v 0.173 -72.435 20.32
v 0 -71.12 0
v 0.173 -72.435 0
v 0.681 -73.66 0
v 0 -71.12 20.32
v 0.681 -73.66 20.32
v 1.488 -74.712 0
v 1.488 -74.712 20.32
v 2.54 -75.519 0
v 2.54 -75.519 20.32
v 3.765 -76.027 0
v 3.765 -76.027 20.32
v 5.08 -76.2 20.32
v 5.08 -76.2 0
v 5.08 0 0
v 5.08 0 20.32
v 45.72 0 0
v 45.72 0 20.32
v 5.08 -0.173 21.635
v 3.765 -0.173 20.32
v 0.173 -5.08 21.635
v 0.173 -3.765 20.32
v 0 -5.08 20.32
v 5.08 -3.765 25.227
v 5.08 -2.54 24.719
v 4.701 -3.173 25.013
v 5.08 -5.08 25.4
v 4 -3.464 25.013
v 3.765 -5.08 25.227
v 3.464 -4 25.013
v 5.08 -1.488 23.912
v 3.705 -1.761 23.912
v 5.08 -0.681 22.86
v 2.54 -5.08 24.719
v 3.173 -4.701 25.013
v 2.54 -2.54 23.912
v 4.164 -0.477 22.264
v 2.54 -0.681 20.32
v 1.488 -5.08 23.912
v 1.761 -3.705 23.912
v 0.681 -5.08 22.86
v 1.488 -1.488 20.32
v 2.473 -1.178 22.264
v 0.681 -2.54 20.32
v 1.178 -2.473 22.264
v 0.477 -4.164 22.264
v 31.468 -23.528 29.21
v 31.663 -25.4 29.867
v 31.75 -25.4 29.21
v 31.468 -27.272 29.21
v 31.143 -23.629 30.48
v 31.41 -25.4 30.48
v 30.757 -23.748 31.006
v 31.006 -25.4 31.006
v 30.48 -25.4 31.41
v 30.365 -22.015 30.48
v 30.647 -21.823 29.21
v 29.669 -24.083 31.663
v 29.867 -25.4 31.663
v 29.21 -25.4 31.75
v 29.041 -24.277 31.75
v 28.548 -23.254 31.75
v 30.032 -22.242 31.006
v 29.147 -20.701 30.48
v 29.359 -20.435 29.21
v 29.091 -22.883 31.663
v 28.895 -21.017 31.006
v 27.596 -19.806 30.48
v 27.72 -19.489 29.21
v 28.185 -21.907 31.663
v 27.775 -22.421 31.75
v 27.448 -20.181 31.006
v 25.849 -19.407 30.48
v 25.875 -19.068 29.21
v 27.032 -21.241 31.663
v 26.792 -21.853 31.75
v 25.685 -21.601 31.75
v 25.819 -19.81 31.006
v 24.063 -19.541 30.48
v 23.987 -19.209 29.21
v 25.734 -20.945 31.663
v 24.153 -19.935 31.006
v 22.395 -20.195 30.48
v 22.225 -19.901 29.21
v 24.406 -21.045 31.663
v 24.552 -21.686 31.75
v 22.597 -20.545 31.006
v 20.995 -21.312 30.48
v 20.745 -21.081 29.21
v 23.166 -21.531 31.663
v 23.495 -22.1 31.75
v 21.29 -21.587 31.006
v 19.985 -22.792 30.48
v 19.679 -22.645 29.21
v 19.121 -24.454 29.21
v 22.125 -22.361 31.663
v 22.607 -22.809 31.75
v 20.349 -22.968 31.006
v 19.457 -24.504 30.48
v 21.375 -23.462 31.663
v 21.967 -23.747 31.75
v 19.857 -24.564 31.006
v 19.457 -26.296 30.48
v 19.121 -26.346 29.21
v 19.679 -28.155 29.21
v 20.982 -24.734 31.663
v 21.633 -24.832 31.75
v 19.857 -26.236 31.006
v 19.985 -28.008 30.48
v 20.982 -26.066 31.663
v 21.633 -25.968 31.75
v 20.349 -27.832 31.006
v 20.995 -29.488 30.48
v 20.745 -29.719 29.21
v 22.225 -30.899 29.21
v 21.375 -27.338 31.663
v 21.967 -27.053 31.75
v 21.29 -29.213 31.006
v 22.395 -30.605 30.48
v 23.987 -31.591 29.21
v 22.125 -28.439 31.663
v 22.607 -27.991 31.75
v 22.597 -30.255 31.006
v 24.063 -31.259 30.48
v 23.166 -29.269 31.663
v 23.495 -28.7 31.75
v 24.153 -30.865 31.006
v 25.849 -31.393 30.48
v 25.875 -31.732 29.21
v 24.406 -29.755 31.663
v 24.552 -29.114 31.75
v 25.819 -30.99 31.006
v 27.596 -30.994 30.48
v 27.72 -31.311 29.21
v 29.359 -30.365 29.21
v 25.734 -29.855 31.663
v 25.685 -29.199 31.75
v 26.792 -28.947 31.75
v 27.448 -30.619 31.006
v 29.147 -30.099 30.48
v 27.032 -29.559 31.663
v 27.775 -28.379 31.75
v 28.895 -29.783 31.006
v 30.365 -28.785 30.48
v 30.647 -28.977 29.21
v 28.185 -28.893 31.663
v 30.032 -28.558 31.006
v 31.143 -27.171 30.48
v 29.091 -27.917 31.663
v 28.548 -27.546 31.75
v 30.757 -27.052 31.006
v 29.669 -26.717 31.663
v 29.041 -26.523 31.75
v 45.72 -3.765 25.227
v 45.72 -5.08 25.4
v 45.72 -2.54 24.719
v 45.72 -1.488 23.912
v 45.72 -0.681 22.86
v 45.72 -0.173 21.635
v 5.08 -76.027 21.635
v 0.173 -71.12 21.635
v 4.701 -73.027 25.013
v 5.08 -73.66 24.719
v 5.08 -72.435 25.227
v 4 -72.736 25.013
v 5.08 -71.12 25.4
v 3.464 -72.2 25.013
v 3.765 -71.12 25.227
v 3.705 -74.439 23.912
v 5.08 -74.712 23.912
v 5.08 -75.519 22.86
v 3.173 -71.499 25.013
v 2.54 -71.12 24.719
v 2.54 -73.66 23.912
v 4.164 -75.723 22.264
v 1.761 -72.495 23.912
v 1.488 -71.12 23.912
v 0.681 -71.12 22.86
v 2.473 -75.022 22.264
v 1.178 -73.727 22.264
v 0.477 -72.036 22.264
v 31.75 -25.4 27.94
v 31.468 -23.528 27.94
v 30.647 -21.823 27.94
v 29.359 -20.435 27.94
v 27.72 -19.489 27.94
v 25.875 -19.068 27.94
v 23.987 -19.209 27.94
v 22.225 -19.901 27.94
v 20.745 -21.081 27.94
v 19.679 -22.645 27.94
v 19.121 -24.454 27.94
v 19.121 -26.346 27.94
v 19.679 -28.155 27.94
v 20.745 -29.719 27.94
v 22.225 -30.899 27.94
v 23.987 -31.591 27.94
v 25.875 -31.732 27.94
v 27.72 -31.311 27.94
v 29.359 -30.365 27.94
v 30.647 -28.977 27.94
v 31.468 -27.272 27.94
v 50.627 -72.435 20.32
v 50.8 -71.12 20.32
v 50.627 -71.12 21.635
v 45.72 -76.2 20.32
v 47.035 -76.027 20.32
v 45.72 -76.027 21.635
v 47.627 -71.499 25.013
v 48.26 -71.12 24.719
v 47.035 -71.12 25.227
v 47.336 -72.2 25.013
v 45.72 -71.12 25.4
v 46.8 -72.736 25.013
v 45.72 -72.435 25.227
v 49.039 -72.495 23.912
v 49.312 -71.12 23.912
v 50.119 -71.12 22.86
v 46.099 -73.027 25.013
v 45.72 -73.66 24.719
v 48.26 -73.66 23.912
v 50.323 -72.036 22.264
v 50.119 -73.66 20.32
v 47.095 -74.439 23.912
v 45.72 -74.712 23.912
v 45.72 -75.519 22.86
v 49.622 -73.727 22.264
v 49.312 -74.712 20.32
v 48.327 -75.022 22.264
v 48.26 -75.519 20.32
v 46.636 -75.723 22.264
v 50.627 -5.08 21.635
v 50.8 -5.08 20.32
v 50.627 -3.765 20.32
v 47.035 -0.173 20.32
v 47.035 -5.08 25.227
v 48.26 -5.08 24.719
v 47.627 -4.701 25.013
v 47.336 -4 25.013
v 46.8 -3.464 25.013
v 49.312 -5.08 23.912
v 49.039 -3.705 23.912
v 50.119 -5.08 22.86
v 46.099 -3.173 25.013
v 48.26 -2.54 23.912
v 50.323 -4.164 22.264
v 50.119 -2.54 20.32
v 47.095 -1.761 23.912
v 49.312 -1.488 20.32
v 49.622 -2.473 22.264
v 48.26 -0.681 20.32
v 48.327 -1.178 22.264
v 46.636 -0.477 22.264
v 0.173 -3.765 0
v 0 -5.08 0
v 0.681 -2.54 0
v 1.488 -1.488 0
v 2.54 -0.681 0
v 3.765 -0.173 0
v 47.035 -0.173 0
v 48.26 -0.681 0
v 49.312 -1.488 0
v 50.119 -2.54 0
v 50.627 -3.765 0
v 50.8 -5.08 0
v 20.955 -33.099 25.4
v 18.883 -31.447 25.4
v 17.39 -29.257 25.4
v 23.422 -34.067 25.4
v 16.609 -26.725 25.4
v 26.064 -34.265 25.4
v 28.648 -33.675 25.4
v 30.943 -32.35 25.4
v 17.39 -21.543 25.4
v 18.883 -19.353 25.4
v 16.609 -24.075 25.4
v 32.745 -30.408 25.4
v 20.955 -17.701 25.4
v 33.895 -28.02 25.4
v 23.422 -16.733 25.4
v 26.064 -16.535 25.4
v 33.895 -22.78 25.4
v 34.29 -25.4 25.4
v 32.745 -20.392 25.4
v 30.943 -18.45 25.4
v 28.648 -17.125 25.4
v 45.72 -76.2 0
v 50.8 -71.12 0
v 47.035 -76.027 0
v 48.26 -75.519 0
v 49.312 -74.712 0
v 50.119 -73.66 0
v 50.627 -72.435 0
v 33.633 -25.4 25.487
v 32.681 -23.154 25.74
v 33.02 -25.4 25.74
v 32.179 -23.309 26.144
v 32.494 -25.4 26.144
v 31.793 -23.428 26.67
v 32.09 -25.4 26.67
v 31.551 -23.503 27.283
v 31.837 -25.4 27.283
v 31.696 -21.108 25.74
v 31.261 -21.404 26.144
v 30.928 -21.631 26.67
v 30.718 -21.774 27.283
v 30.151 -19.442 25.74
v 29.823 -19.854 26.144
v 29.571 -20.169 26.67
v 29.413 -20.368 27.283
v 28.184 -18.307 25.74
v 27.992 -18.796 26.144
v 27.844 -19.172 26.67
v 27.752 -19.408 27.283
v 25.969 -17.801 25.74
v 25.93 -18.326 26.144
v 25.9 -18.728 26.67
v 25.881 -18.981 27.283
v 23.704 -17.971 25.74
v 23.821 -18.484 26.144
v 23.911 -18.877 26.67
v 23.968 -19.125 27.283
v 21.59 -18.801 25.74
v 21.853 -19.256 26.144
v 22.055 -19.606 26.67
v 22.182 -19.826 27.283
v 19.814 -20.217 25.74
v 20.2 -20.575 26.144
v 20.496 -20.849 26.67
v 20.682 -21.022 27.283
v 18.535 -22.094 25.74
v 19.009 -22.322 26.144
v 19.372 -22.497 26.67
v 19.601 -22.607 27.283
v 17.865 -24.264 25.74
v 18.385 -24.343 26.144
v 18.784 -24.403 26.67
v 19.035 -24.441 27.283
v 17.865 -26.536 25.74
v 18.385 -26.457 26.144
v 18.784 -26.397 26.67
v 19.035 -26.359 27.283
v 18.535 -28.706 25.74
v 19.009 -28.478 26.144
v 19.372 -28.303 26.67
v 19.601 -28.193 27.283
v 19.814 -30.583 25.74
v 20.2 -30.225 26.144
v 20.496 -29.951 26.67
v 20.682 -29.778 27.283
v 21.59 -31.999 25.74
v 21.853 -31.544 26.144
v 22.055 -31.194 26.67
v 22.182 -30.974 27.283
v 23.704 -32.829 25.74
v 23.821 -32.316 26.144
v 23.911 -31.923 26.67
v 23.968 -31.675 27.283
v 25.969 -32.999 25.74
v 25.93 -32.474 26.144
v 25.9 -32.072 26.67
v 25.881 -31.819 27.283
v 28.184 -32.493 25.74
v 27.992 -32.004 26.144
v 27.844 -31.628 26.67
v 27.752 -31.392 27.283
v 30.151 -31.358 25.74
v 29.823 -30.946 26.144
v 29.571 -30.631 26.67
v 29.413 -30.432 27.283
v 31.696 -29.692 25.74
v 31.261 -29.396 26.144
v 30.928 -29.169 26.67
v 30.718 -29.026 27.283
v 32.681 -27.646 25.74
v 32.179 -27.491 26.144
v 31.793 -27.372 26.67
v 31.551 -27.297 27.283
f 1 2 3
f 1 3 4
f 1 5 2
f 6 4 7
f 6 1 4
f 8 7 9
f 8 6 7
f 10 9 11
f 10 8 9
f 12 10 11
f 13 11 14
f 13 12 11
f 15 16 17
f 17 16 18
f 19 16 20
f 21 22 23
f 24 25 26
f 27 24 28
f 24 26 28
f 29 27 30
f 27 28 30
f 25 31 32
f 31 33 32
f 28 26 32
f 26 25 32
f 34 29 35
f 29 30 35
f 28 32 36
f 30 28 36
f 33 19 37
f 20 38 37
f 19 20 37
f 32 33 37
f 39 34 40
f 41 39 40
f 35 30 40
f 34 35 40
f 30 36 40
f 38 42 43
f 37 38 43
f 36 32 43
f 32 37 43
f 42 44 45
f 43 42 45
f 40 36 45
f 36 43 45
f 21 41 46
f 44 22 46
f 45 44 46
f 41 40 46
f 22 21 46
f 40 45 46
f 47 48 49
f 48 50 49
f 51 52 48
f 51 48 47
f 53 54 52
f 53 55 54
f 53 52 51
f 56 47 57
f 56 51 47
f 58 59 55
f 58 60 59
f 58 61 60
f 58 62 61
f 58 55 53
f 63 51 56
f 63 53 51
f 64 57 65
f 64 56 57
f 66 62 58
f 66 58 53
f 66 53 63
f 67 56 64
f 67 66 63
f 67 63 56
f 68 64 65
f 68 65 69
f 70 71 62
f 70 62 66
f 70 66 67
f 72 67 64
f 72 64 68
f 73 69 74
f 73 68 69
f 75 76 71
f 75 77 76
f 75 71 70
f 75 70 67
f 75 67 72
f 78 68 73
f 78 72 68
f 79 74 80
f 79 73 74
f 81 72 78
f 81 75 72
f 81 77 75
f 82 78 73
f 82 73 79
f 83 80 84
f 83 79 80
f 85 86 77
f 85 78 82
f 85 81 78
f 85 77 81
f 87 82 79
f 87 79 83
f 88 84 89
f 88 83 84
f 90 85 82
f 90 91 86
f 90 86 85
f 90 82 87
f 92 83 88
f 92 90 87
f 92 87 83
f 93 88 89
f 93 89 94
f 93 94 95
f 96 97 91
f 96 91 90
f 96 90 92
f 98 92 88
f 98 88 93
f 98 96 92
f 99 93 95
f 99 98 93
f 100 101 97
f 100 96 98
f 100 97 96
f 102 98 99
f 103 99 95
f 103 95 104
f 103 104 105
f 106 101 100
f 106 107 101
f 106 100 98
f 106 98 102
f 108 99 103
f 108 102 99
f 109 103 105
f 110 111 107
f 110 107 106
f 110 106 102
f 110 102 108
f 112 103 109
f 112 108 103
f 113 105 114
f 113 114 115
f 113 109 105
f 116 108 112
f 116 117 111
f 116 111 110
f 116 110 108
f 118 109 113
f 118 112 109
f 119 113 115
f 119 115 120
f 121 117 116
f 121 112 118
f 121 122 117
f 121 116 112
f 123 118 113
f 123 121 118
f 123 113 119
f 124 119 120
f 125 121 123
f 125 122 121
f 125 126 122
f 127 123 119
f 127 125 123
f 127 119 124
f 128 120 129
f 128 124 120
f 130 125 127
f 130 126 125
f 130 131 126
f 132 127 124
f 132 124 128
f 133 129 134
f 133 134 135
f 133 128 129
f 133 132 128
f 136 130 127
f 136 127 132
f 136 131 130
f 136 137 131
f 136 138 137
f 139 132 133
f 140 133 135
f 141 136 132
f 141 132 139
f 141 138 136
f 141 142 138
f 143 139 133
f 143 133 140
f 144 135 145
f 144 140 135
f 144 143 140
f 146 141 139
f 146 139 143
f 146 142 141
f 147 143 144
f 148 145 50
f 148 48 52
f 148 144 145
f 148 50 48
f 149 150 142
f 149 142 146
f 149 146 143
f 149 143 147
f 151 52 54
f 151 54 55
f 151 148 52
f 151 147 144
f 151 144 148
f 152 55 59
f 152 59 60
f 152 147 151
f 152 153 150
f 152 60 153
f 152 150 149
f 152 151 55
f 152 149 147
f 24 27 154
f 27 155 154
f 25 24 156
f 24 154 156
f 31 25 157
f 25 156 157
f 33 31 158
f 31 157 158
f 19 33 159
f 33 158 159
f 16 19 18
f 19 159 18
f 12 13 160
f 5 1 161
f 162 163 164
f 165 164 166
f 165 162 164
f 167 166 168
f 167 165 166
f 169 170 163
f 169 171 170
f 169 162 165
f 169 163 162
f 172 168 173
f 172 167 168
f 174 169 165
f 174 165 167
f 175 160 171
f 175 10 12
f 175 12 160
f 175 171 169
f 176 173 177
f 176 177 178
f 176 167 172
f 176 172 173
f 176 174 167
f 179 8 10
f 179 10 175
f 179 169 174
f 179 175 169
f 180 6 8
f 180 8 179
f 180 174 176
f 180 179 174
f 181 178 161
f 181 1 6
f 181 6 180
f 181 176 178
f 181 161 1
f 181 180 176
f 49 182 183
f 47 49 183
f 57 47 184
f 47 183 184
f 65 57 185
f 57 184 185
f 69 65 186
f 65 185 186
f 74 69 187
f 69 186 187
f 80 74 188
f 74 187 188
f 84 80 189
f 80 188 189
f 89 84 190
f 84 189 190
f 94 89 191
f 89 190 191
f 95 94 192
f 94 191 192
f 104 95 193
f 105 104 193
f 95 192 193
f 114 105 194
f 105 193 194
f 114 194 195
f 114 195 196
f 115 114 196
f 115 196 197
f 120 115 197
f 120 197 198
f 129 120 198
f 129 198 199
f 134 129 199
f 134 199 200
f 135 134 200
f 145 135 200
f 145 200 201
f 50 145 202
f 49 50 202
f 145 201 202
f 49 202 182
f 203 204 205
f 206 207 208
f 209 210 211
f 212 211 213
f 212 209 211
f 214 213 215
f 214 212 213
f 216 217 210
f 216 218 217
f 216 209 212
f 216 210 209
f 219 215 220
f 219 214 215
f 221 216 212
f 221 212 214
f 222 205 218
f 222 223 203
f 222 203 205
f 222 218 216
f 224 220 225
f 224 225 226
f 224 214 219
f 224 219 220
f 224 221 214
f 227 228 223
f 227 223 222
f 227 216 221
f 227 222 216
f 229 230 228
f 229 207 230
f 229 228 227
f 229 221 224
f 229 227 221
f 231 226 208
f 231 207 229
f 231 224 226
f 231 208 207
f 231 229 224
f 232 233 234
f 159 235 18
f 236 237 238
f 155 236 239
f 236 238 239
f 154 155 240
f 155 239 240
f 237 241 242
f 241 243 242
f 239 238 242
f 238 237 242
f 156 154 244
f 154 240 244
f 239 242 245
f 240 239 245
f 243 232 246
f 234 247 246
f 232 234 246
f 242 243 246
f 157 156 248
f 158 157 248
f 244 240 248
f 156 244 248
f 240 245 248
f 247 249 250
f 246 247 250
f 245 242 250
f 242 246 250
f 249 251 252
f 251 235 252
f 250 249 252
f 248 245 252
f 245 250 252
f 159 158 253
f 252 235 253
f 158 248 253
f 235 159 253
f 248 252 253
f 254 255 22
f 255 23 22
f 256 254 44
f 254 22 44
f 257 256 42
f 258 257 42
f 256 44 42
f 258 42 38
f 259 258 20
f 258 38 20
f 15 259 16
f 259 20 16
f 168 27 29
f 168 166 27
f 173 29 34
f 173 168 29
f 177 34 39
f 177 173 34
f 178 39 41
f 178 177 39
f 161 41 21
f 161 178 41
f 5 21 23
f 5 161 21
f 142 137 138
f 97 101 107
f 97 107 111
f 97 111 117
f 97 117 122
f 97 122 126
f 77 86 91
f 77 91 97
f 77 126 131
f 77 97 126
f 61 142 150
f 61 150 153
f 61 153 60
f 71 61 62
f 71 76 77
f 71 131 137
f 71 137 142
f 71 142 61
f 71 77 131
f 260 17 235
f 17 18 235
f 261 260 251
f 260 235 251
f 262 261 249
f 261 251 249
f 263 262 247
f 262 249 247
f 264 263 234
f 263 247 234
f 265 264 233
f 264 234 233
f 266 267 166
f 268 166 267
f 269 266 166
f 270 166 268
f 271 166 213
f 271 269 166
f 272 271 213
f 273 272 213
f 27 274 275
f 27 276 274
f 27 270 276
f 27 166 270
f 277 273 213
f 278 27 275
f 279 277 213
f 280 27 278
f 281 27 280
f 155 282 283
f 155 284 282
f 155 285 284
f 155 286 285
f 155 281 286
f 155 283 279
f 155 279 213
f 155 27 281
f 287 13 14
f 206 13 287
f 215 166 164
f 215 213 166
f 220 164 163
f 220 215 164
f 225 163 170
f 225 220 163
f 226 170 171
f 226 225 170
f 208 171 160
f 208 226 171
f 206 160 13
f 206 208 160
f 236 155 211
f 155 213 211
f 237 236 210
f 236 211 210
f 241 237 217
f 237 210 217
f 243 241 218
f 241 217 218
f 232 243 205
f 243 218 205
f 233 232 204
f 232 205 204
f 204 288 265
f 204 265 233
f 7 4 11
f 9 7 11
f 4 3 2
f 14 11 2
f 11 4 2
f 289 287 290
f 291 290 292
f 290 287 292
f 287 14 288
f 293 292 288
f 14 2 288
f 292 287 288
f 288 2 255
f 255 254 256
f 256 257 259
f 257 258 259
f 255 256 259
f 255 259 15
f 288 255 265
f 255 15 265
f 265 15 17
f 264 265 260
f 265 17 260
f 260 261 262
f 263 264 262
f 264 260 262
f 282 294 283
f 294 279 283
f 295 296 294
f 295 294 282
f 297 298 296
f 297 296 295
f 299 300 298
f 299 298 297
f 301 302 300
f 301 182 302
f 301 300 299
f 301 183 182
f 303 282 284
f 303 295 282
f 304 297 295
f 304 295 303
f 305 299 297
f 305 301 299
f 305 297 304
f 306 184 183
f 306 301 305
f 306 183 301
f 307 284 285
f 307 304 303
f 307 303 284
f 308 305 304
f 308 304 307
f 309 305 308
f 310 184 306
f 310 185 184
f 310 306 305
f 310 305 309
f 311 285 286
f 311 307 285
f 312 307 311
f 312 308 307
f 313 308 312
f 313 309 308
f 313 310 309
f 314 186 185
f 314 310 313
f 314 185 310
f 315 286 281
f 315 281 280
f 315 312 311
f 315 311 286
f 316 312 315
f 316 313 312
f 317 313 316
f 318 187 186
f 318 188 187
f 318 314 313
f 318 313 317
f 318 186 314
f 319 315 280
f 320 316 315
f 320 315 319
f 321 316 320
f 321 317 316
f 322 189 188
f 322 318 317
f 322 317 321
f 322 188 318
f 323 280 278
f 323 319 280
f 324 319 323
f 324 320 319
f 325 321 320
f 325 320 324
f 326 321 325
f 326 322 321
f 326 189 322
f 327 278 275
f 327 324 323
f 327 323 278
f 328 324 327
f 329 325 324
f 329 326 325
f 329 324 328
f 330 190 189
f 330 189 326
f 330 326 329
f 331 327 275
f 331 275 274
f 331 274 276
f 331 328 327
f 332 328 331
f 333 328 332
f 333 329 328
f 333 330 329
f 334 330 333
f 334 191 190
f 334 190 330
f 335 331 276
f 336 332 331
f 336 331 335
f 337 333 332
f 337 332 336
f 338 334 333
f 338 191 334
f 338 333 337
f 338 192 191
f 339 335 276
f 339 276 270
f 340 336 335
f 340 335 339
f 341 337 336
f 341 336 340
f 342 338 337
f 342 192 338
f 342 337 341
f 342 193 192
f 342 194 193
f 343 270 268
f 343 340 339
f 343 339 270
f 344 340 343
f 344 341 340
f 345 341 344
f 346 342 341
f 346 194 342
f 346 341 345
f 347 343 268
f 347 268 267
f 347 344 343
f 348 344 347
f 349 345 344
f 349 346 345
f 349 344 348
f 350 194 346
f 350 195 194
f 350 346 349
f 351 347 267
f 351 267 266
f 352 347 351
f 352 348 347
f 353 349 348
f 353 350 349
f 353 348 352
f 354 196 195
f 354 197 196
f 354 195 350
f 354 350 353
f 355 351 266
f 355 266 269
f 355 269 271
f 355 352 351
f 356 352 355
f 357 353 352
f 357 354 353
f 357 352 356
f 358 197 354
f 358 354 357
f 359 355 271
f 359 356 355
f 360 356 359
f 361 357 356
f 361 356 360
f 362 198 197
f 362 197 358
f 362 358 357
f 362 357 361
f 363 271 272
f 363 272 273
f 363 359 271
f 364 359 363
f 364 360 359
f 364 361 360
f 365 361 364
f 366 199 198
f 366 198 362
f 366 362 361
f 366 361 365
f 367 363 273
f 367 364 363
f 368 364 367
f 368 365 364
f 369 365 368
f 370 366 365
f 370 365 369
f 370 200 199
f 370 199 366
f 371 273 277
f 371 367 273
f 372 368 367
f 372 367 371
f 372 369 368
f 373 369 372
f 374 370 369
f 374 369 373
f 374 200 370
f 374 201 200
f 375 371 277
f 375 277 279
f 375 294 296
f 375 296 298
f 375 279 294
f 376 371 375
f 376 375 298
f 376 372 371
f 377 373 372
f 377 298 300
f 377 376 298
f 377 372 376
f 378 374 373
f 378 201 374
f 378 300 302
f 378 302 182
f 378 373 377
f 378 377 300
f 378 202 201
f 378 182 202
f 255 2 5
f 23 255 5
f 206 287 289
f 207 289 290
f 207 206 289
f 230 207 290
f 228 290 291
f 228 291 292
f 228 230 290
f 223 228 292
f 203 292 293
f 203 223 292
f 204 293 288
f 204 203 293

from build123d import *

# Parameters (mm, degrees)
F0_W     = 50.8
F0_H     = 25.4
F1_DEPTH = 76.2
F2_R     = 6.35
F3_DEPTH = 6.35
F4_R     = 2.54
F5_R     = 5.08


with BuildPart() as f1:
    # F0 (on Front) → F1 (new body)
    with BuildSketch(Plane.XZ):
        with Locations((25.4, 12.7)):
            Rectangle(F0_W, F0_H)
    extrude(amount=F1_DEPTH)

    # F2 (on face) → F3 (join)
    with BuildSketch(Plane.XY.offset(25.4)):
        with Locations((25.4, -25.4)):
            Circle(F2_R)
    extrude(amount=F3_DEPTH)

    # F4
    f4_edges = [f1.edges().sort_by_distance(p)[0] for p in [
        (19.05, -25.4, 25.4),
        (19.05, -25.4, 31.75),
    ]]
    fillet(f4_edges, radius=F4_R)

    # F5
    f5_edges = [f1.edges().sort_by_distance(p)[0] for p in [
        (50.8, -76.2, 12.7),
        (50.8, 0, 12.7),
        (0, 0, 12.7),
        (0, -76.2, 12.7),
        (16.51, -25.4, 25.4),
        (50.8, -38.1, 25.4),
        (25.4, 0, 25.4),
        (25.4, -76.2, 25.4),
        (0, -38.1, 25.4),
    ]]
    fillet(f5_edges, radius=F5_R)


solid = f1.part
